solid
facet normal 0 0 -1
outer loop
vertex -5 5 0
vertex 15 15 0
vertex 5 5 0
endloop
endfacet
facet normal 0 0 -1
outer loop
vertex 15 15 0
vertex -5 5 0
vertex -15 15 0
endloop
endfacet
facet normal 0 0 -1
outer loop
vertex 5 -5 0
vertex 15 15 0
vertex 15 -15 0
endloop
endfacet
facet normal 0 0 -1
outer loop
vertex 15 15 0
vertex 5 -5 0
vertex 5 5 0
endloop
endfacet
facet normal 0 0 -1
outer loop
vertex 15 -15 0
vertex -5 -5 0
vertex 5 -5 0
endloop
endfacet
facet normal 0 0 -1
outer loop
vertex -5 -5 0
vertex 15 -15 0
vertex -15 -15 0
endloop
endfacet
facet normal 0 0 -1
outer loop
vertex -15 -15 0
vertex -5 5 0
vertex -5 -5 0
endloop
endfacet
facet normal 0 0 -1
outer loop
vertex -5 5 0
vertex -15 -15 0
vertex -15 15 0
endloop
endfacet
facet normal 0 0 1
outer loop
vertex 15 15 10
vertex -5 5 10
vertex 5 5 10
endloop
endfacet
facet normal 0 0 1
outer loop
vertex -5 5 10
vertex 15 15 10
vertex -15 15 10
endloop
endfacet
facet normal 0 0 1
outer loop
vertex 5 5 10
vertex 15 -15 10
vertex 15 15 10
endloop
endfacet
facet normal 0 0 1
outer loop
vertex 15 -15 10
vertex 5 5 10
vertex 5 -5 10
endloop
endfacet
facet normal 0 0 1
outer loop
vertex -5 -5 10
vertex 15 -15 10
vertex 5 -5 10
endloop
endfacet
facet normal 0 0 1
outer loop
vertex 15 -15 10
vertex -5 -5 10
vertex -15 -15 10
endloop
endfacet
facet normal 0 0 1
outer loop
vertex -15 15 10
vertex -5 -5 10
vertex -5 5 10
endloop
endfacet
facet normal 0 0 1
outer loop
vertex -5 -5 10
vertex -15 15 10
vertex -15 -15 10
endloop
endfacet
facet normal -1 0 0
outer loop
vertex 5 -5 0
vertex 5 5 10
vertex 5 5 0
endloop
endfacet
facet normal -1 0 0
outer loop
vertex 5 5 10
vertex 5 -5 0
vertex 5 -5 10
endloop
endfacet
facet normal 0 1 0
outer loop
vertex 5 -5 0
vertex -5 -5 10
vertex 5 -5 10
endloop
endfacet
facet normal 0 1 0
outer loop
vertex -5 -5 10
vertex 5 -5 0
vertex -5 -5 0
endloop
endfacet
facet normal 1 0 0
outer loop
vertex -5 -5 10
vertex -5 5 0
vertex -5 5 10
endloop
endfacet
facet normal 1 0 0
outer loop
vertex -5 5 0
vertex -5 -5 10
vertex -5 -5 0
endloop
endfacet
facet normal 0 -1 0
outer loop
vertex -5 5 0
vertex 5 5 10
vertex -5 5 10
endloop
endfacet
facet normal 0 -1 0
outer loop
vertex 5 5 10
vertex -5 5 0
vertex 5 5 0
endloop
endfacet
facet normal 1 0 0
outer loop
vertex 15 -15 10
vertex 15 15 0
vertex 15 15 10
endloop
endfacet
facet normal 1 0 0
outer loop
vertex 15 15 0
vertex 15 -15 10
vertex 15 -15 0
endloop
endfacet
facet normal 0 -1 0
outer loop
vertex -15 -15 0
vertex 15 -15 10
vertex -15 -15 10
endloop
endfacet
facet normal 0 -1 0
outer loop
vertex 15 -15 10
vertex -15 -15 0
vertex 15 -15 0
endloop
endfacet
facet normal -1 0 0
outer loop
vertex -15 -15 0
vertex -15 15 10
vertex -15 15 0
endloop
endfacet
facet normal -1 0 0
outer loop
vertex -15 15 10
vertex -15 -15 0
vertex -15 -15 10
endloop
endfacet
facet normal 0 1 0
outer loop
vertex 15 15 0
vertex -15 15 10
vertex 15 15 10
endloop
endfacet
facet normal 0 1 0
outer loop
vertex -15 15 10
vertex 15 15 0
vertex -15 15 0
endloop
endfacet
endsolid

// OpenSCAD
union() {
    translate([-15,-15,0]) {
        scale(10) {
            polyhedron(
                //         1------------------0
                //        /|                 /|
                //       / |    9----8      / |
                //      /  5-- /|   /| ----/--4
                //     /  /  11----10|    /  /
                //    /  /    |13--|-12  /  /
                //   3------  |/   |/ --2  /
                //   | /     15----14   | /
                //   |/                 |/
                //   7------------------6
                points=[
                    [3,3,1],
                    [0,3,1],
                    [3,0,1],
                    [0,0,1],
                    [3,3,0],
                    [0,3,0],
                    [3,0,0],
                    [0,0,0],

                    [2,2,1],
                    [1,2,1],
                    [2,1,1],
                    [1,1,1],
                    [2,2,0],
                    [1,2,0],
                    [2,1,0],
                    [1,1,0],
                ],
                faces=[
                    [  4,  5, 13, 12 ],
                    [  4, 12, 14,  6 ],
                    [  6, 14, 15,  7 ],
                    [  7, 15, 13,  5 ],

                    [  1,  0,  8,  9 ],
                    [  0,  2, 10,  8 ],
                    [  2,  3, 11, 10 ],
                    [  3,  1,  9, 11 ],

                    [  8, 10, 14, 12 ],
                    [ 10, 11, 15, 14 ],
                    [ 11,  9, 13, 15 ],
                    [  9,  8, 12, 13 ],

                    [  0,  4,  6,  2 ],
                    [  2,  6,  7,  3 ],
                    [  3,  7,  5,  1 ],
                    [  1,  5,  4,  0 ],
                ]
            );
        };
    }
}
